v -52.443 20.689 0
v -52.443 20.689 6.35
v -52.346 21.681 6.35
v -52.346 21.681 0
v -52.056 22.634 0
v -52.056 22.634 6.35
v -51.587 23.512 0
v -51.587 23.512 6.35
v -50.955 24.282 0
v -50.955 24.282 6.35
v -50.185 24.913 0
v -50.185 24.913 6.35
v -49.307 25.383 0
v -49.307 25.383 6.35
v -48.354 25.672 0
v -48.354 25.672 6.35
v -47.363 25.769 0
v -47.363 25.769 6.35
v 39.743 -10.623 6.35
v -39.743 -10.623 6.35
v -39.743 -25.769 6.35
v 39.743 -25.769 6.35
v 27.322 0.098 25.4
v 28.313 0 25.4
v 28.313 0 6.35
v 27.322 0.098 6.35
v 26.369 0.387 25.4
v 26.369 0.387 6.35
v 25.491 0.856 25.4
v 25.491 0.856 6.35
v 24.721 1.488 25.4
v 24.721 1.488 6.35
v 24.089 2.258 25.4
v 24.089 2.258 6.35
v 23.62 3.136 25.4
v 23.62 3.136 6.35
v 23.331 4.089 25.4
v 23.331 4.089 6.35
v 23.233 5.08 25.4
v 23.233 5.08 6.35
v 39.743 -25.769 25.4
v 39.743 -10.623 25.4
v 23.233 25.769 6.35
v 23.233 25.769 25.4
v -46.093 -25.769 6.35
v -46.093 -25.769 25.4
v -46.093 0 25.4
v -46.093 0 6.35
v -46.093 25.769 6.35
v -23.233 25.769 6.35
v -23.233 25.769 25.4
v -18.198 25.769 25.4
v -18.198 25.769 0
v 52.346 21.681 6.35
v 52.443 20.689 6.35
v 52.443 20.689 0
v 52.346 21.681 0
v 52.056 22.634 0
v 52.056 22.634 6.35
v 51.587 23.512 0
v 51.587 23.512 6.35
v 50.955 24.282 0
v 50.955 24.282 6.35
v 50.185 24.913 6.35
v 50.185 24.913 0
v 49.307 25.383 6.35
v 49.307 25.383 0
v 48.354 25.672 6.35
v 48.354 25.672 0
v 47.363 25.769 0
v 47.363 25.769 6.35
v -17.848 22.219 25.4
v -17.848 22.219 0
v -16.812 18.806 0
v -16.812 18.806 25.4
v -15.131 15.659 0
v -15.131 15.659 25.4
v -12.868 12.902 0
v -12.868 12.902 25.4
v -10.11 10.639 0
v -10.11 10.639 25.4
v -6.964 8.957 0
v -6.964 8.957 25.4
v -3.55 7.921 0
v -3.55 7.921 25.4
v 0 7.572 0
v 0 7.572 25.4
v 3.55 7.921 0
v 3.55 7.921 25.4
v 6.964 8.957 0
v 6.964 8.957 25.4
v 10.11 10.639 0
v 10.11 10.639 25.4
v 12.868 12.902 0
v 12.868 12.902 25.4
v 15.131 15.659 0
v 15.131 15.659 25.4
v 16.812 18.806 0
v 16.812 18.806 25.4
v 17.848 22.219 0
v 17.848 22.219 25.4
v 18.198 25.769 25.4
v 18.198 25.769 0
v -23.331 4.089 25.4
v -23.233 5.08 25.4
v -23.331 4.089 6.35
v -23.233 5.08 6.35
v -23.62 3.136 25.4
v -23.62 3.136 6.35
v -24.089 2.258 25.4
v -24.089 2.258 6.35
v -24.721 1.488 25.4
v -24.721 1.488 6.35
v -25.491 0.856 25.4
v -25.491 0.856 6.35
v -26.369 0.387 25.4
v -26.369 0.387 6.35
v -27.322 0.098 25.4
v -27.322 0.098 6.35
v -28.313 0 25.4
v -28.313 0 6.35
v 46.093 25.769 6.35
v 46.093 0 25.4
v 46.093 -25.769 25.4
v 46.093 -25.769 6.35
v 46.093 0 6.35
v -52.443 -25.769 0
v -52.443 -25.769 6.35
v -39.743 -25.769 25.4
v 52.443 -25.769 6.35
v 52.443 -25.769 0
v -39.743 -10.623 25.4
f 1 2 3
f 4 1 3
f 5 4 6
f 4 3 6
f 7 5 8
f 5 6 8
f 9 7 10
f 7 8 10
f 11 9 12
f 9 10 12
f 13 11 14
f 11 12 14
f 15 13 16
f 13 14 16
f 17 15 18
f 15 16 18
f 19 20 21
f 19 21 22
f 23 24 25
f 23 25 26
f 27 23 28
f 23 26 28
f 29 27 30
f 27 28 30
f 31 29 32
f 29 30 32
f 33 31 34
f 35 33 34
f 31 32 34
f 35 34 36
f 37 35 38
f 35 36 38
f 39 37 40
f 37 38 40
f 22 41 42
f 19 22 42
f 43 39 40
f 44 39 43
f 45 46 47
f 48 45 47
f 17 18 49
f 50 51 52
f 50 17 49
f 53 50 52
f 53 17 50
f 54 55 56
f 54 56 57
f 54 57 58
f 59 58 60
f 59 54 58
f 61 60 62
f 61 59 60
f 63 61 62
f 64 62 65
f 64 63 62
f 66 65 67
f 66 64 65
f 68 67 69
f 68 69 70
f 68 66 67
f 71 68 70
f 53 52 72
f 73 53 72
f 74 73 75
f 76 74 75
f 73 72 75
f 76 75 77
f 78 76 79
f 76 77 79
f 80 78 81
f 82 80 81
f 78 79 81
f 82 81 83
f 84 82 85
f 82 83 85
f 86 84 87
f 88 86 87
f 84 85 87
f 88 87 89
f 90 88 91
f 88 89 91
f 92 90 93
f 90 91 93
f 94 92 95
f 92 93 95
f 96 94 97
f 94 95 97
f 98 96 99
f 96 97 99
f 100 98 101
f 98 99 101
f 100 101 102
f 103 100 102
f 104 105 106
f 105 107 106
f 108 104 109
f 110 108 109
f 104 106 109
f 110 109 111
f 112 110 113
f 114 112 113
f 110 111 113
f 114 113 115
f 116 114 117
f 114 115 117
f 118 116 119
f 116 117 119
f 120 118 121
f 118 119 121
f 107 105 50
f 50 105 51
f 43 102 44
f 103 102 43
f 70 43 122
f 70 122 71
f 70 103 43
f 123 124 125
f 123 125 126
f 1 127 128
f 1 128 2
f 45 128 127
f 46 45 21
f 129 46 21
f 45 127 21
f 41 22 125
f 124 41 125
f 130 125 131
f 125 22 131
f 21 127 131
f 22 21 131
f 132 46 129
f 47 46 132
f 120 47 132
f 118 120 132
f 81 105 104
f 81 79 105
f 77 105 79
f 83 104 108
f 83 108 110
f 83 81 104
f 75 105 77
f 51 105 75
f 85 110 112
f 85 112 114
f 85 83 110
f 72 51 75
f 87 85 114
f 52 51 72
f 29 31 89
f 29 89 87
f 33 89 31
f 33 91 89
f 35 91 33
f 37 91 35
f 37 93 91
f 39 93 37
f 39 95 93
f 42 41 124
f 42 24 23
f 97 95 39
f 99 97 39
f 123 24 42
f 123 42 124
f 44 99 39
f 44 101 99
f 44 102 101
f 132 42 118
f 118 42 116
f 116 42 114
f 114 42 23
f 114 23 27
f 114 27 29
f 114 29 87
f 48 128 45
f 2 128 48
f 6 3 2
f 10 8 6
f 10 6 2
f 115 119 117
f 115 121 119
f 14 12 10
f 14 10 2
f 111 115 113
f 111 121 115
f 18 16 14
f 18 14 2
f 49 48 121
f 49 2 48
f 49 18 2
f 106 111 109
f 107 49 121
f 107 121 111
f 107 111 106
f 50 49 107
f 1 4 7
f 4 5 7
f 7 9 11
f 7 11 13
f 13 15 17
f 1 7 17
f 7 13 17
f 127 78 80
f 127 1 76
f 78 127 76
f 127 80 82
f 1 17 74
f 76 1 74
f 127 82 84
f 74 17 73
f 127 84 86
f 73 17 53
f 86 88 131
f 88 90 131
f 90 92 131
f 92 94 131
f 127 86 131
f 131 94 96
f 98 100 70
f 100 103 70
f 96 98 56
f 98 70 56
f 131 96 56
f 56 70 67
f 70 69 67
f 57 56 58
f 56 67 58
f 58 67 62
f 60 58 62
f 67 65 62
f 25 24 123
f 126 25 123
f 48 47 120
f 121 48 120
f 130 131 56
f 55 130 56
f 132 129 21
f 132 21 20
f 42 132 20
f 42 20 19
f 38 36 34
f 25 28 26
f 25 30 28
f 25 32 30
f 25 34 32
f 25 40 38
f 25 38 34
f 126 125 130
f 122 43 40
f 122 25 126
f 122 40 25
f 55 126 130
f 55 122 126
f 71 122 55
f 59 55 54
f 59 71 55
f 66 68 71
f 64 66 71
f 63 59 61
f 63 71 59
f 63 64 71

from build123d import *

# Parameters (mm, degrees)
F0_W      = 104.8863008618
F0_H      = 51.5389591455
F1_DEPTH  = 25.4
F2_R      = 5.08
F3_W      = 79.4863008618
F3_H      = 15.1469794668
F4_DEPTH  = 19.05
F6_DEPTH  = 25.4
F7_W      = 6.35
F7_H      = 51.5389591455
F8_DEPTH  = 19.05
F9_W      = 22.86
F9_H      = 25.7694795728
F10_DEPTH = 19.05
F11_R     = 5.08


with BuildPart() as f1:
    # F0 (on Top) → F1 (new body)
    with BuildSketch(Plane.XY):
        Rectangle(F0_W, F0_H)
    extrude(amount=F1_DEPTH)

    # F2
    f2_edges = [f1.edges().sort_by_distance(p)[0] for p in [
        (-52.44315, 25.76948, 12.7),
        (52.44315, 25.76948, 12.7),
    ]]
    fillet(f2_edges, radius=F2_R)

    # F3 (on face) → F4 (cut)
    with BuildSketch(Plane.XY.offset(25.4)):
        with Locations((0, -18.1959898394)):
            Rectangle(F3_W, F3_H)
    extrude(amount=-F4_DEPTH, mode=Mode.SUBTRACT)

    # F5 (on face) → F6 (cut)
    with BuildSketch(Plane.XY.offset(25.4)):
        with BuildLine():
            ThreePointArc((-18.1976626917, 25.7694795728), (0, 7.571816881), (18.1976626917, 25.7694795728))
            Line((18.1976626917, 25.7694795728), (-18.1976626917, 25.7694795728))
        make_face()
    extrude(amount=-F6_DEPTH, mode=Mode.SUBTRACT)

    # F7 (on face) → F8 (cut)
    with BuildSketch(Plane.XY.offset(25.4)):
        with Locations((-49.2681504309, 0)):
            Rectangle(F7_W, F7_H)
        with Locations((49.2681504309, 0)):
            Rectangle(F7_W, F7_H)
    extrude(amount=-F8_DEPTH, mode=Mode.SUBTRACT)

    # F9 (on face) → F10 (cut)
    with BuildSketch(Plane.XY.offset(25.4)):
        with Locations((-34.6631504309, 12.8847397864)):
            Rectangle(F9_W, F9_H)
        with Locations((34.6631504309, 12.8847397864)):
            Rectangle(F9_W, F9_H)
    extrude(amount=-F10_DEPTH, mode=Mode.SUBTRACT)

    # F11
    f11_edges = [f1.edges().sort_by_distance(p)[0] for p in [
        (-23.23315, 0, 15.875),
        (23.23315, 0, 15.875),
    ]]
    fillet(f11_edges, radius=F11_R)


solid = f1.part
